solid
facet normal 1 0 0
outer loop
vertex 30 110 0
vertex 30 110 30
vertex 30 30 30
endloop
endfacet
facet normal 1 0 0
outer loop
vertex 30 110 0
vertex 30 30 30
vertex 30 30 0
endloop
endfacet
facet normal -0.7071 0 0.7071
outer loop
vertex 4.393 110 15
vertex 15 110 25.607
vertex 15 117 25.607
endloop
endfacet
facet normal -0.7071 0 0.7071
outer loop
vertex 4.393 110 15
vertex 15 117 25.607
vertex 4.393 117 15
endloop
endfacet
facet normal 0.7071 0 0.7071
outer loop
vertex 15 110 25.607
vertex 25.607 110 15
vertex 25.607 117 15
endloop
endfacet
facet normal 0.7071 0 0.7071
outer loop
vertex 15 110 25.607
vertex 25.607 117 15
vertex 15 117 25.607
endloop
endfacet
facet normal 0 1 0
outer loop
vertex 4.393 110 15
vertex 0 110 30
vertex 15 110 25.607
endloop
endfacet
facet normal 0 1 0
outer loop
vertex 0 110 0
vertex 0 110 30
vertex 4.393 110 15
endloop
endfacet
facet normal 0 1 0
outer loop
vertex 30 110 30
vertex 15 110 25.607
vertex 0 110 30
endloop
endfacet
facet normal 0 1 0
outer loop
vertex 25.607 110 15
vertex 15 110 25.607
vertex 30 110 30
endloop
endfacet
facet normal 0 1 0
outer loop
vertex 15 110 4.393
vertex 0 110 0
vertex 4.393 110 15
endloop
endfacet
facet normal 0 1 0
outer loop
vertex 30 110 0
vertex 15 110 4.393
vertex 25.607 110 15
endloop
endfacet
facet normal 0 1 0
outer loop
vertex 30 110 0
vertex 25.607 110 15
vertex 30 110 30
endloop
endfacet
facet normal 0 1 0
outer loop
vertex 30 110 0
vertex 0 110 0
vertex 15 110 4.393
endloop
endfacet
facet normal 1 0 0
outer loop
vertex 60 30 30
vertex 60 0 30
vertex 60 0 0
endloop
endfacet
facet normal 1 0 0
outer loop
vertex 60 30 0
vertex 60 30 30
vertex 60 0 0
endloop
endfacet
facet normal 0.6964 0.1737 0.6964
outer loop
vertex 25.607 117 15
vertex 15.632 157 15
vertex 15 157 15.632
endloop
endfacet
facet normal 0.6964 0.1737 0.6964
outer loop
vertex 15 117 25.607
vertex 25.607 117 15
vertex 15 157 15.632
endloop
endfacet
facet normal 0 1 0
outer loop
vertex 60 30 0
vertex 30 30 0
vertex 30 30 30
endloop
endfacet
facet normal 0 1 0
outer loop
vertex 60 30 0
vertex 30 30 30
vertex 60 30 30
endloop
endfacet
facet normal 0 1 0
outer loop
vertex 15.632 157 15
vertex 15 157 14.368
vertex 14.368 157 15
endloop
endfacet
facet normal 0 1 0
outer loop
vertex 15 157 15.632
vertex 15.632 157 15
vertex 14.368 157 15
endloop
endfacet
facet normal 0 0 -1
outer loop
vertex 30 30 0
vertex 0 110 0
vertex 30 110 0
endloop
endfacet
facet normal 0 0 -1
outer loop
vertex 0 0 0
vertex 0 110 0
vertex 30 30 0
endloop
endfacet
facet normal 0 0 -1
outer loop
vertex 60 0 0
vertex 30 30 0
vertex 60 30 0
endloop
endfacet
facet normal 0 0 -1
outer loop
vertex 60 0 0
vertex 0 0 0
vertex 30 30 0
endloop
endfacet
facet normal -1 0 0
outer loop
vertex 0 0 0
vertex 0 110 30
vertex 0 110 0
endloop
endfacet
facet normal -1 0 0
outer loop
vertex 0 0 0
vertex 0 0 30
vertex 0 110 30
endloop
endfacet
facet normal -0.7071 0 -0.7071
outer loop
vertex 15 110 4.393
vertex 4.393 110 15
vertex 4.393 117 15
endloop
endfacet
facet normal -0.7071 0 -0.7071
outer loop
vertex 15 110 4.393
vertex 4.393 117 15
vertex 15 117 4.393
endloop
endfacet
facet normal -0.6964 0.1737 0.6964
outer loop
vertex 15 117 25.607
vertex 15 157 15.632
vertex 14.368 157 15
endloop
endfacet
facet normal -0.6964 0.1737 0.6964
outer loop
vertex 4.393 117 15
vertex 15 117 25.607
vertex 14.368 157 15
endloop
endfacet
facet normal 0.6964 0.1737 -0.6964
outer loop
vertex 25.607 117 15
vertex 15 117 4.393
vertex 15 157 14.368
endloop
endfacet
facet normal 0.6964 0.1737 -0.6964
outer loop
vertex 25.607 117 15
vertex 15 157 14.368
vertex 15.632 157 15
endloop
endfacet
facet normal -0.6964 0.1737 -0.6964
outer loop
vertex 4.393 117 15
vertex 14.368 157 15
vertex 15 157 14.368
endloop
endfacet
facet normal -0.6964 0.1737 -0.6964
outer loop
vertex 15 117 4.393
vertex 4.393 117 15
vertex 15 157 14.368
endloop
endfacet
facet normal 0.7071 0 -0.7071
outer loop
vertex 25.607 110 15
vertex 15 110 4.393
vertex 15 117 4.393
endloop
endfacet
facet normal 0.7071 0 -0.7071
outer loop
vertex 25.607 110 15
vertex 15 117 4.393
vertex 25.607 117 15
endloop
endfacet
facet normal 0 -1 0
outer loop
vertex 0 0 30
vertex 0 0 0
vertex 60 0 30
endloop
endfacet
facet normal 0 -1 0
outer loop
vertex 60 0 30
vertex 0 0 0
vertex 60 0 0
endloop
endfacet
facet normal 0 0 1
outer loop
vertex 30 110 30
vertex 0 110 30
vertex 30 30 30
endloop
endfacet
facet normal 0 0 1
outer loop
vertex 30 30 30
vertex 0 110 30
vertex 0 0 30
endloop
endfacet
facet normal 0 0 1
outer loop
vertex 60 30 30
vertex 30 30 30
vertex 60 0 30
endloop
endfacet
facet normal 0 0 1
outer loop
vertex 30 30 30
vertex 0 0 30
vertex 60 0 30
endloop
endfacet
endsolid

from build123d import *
from OCP.BRepFilletAPI import BRepFilletAPI_MakeChamfer

# Parameters (mm, degrees)
SKETCH_1_W      = 60
SKETCH_1_H      = 30
EXTRUDE_1_DEPTH = 30
SKETCH_2_W      = 30
SKETCH_2_H      = 30
EXTRUDE_2_DEPTH = 80
EXTRUDE_3_DEPTH = 47
CHAMFER_1_SIZE  = 40
CHAMFER_1_SIZE2 = 7.053079228


with BuildPart() as part:
    # ｽｹｯﾁ1 → ﾎﾞｽ - 押し出し1 (new body)
    with BuildSketch(Plane(origin=(0, 0, 0), x_dir=(1, 0, 0), z_dir=(0, 1, 0))):
        with Locations((30, -15)):
            Rectangle(SKETCH_1_W, SKETCH_1_H)
    extrude(amount=EXTRUDE_1_DEPTH)

    # ｽｹｯﾁ2 → ﾎﾞｽ - 押し出し2 (add)
    with BuildSketch(Plane(origin=(0, 30, 0), x_dir=(1, 0, 0), z_dir=(0, 1, 0))):
        with Locations((15, -15)):
            Rectangle(SKETCH_2_W, SKETCH_2_H)
    extrude(amount=EXTRUDE_2_DEPTH)

    # ｽｹｯﾁ3 → ﾎﾞｽ - 押し出し3 (add)
    with BuildSketch(Plane(origin=(0, 110, 0), x_dir=(1, 0, 0), z_dir=(0, 1, 0))):
        Polygon((4.393398282, -15), (15, -4.393398282), (25.606601718, -15), (15, -25.606601718), align=None)
    extrude(amount=EXTRUDE_3_DEPTH)

    # 面取り1: one chamfer whose edges measure the first distance from different faces: ONE call of the kernel's chamfer builder (chamfer() names one face for all edges)
    chamfer_1_edges_1 = [part.edges().sort_by_distance(p)[0] for p in [
        (9.696699141, 157, 20.303300859),
    ]]
    chamfer_1_side_1 = [part.faces().sort_by_distance(p)[0] for p in [
        (9.696699141, 133.5, 20.303300859),
    ]]
    chamfer_1_edges_2 = [part.edges().sort_by_distance(p)[0] for p in [
        (20.303300859, 157, 20.303300859),
    ]]
    chamfer_1_side_2 = [part.faces().sort_by_distance(p)[0] for p in [
        (20.303300859, 133.5, 20.303300859),
    ]]
    chamfer_1_edges_3 = [part.edges().sort_by_distance(p)[0] for p in [
        (20.303300859, 157, 9.696699141),
    ]]
    chamfer_1_side_3 = [part.faces().sort_by_distance(p)[0] for p in [
        (20.303300859, 133.5, 9.696699141),
    ]]
    chamfer_1_edges_4 = [part.edges().sort_by_distance(p)[0] for p in [
        (9.696699141, 157, 9.696699141),
    ]]
    chamfer_1_side_4 = [part.faces().sort_by_distance(p)[0] for p in [
        (9.696699141, 133.5, 9.696699141),
    ]]
    chamfer_1 = BRepFilletAPI_MakeChamfer(part.part.solid().wrapped)
    for e in chamfer_1_edges_1:
        chamfer_1.Add(CHAMFER_1_SIZE, CHAMFER_1_SIZE2, e.wrapped, chamfer_1_side_1[0].wrapped)  # the first distance lies on this face
    for e in chamfer_1_edges_2:
        chamfer_1.Add(CHAMFER_1_SIZE, CHAMFER_1_SIZE2, e.wrapped, chamfer_1_side_2[0].wrapped)  # the first distance lies on this face
    for e in chamfer_1_edges_3:
        chamfer_1.Add(CHAMFER_1_SIZE, CHAMFER_1_SIZE2, e.wrapped, chamfer_1_side_3[0].wrapped)  # the first distance lies on this face
    for e in chamfer_1_edges_4:
        chamfer_1.Add(CHAMFER_1_SIZE, CHAMFER_1_SIZE2, e.wrapped, chamfer_1_side_4[0].wrapped)  # the first distance lies on this face
    add(Compound.cast(chamfer_1.Shape()), mode=Mode.REPLACE)


solid = part.part
